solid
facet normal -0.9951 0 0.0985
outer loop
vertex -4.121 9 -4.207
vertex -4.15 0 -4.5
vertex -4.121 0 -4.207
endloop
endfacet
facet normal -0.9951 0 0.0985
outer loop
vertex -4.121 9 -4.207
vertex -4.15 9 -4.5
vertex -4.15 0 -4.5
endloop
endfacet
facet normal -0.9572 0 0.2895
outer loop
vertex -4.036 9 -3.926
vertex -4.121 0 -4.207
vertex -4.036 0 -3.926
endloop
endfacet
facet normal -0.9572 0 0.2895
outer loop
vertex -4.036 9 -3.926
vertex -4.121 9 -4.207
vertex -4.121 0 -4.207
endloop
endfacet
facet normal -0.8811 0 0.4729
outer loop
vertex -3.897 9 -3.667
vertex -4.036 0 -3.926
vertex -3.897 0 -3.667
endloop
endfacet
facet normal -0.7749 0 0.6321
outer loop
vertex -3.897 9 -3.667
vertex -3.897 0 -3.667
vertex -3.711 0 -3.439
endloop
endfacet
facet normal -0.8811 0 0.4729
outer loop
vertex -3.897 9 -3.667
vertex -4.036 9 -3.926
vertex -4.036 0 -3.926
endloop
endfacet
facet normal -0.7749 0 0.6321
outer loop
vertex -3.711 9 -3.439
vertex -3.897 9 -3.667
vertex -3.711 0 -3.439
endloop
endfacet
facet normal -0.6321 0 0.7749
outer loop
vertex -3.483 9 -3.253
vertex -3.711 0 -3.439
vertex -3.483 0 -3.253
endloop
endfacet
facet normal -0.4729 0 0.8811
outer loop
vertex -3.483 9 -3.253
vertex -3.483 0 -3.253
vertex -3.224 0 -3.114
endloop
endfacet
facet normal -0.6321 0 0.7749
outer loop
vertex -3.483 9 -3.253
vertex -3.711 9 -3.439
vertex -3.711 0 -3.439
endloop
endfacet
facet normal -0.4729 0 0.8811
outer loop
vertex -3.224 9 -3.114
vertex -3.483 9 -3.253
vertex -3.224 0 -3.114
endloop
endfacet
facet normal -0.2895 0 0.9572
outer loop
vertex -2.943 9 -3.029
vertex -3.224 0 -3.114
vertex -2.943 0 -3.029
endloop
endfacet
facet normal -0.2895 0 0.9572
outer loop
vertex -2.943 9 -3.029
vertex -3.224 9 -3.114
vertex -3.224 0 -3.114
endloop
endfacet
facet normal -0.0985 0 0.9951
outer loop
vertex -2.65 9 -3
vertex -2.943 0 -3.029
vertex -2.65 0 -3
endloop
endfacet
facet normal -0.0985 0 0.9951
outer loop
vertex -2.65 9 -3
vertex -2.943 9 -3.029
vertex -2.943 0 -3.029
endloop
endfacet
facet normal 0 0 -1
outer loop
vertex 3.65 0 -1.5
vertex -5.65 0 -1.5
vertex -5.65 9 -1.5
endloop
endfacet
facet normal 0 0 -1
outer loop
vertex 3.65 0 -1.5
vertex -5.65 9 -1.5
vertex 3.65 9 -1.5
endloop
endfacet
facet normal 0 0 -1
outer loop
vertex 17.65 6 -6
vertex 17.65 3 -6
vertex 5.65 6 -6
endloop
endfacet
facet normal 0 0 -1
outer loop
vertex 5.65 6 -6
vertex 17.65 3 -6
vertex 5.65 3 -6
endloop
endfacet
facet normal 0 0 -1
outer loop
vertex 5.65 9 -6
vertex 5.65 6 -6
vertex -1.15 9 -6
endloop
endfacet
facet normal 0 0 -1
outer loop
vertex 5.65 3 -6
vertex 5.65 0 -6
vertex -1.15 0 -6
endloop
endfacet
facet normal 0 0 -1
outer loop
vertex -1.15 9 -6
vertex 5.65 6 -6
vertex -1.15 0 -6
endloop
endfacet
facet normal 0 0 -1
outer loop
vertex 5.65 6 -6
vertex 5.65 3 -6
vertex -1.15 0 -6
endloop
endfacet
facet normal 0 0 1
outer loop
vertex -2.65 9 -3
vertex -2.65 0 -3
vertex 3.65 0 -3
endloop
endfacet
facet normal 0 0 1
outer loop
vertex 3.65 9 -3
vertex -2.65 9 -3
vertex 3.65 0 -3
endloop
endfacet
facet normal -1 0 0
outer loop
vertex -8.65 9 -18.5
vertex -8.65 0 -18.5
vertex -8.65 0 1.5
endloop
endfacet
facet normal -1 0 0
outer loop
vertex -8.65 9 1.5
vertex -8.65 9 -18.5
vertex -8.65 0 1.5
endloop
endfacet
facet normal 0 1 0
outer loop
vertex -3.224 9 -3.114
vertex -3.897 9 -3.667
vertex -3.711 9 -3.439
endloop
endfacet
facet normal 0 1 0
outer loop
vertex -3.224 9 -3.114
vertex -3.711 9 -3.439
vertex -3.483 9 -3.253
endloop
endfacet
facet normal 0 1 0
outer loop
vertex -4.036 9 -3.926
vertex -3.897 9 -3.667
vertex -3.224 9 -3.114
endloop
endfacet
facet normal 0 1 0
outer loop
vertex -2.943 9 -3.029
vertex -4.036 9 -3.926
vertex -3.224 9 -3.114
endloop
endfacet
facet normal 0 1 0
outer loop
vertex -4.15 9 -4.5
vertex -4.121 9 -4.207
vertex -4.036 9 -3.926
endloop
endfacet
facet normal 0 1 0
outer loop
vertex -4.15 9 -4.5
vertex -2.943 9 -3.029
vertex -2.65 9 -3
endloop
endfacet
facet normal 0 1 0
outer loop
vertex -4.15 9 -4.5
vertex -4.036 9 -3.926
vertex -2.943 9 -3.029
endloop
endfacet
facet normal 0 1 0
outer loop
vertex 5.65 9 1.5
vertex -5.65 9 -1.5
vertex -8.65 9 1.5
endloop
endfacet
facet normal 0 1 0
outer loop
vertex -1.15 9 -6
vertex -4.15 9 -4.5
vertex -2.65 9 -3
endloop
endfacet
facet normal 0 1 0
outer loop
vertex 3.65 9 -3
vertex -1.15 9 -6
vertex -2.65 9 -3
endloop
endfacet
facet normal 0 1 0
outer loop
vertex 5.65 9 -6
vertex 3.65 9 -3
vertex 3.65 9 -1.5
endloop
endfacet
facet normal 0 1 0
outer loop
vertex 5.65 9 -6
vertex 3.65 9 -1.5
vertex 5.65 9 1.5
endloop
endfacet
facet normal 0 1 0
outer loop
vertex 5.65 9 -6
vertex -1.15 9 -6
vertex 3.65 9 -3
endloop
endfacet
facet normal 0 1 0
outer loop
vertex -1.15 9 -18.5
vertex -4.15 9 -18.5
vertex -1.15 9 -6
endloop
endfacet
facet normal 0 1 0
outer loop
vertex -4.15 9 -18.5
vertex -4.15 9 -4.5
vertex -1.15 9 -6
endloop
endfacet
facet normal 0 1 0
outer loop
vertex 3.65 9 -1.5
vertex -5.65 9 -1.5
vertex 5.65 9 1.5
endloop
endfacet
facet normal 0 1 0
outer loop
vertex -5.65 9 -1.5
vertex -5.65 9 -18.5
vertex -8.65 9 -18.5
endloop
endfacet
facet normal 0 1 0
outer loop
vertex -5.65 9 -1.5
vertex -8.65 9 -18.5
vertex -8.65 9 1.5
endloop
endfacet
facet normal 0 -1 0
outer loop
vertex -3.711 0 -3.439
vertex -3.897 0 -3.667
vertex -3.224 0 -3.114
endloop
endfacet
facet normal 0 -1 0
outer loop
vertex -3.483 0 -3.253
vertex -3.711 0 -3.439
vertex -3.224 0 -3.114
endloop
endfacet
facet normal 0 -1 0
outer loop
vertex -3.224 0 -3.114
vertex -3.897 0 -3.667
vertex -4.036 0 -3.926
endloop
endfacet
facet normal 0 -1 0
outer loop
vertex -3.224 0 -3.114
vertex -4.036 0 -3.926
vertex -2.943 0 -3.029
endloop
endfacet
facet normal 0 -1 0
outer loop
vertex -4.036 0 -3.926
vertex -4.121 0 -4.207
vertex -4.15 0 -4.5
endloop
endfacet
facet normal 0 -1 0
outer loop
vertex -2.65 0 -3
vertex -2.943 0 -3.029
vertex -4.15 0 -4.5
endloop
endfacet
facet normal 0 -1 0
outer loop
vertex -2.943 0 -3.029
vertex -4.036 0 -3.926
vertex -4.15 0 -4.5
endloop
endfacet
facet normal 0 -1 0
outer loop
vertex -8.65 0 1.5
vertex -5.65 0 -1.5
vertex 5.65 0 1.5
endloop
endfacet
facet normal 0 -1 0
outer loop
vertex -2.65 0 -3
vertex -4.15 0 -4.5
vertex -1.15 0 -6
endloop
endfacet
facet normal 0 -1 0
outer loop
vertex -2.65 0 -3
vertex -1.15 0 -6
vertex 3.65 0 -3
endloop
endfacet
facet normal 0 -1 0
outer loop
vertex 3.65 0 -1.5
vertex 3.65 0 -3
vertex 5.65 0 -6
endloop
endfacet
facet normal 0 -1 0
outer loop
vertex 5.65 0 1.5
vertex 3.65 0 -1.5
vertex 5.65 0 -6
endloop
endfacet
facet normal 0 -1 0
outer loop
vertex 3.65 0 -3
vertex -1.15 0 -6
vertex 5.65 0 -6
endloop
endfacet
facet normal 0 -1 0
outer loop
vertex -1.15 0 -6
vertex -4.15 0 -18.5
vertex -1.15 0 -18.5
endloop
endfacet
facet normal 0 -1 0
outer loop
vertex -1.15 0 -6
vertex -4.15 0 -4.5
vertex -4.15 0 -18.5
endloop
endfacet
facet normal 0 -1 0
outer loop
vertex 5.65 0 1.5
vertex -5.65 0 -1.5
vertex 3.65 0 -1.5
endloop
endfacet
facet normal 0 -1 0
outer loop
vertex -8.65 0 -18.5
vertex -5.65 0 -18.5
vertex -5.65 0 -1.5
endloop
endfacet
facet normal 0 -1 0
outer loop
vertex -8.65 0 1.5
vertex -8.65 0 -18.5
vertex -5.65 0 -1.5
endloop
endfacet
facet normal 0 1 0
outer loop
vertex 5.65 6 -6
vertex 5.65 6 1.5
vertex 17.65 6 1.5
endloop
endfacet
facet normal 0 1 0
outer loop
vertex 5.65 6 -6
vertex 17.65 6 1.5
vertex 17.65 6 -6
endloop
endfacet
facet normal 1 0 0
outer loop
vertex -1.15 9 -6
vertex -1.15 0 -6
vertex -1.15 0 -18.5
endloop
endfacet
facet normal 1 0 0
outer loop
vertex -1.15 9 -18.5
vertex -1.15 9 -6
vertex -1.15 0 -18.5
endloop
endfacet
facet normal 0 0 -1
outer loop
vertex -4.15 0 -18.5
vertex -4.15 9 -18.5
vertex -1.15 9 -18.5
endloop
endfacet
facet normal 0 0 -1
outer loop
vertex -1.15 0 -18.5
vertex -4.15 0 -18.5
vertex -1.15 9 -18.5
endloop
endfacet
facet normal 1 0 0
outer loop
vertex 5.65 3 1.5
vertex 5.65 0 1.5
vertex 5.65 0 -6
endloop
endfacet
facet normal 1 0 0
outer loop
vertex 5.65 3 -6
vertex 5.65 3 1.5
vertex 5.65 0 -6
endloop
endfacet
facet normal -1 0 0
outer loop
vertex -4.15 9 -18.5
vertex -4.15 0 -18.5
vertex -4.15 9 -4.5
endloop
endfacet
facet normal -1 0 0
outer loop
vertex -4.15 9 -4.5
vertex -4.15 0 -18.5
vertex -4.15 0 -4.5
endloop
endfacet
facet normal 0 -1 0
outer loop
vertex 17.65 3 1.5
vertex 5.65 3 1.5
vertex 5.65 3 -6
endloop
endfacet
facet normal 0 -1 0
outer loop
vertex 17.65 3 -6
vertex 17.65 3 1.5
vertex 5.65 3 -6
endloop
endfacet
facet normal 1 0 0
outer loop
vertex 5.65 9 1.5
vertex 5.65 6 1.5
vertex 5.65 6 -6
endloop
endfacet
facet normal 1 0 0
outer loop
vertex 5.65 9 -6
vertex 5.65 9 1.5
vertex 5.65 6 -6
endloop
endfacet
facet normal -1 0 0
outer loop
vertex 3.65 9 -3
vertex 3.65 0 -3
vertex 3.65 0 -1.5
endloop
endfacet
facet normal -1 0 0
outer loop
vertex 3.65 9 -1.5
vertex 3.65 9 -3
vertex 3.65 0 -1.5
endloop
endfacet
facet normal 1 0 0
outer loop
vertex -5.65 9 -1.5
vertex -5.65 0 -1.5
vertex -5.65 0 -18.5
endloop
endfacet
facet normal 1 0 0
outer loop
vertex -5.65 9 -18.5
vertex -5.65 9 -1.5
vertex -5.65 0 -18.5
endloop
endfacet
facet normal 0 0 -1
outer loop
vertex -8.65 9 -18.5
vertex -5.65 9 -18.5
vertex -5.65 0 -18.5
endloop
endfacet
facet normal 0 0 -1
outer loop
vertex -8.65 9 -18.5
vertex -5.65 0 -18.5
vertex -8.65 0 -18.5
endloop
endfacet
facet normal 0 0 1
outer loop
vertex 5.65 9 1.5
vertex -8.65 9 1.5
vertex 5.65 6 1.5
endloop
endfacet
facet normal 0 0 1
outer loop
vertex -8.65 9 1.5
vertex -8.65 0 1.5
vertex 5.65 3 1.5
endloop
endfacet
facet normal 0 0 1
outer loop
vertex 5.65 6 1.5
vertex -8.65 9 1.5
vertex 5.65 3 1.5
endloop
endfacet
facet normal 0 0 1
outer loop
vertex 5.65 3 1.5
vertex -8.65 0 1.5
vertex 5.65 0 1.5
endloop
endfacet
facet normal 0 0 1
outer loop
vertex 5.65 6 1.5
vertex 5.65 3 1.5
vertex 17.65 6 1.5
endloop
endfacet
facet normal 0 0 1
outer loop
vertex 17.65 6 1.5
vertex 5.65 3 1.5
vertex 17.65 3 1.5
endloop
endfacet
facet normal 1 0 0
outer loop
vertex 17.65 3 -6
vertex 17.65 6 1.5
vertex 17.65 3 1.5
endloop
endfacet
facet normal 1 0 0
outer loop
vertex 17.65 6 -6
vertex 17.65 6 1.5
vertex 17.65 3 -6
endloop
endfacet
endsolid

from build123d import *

# Parameters (mm, degrees)
SKETCH1_W           = 11.3
SKETCH1_H           = 3
SKETCH1_W_2         = 3
SKETCH1_H_2         = 12.5
BOSS_EXTRUDE1_DEPTH = 9
FILLET1_R           = 1.5
SKETCH2_W           = 7.5
SKETCH2_H           = 3
BOSS_EXTRUDE2_DEPTH = 12


with BuildPart() as part:
    # Sketch1 → Boss-Extrude1 (new body)
    with BuildSketch(Plane(origin=(0, 0, 0), x_dir=(1, 0, 0), z_dir=(0, 1, 0))):
        Polygon((-8.65, -1.5), (-5.65, -1.5), (-5.65, 1.5), (-5.65, 18.5), (-8.65, 18.5), align=None)
        Rectangle(SKETCH1_W, SKETCH1_H)
        Polygon((3.65, 1.5), (5.65, 1.5), (5.65, 6), (3.65, 6), (3.65, 3), align=None)
        Polygon((-4.15, 3), (3.65, 3), (3.65, 6), (-1.15, 6), (-4.15, 6), align=None)
        with Locations((-2.65, 12.25)):
            Rectangle(SKETCH1_W_2, SKETCH1_H_2)
    extrude(amount=BOSS_EXTRUDE1_DEPTH)

    # Fillet1
    fillet1_edges = [part.edges().sort_by_distance(p)[0] for p in [
        (-4.15, 4.5, -3),
    ]]
    fillet(fillet1_edges, radius=FILLET1_R)

    # Sketch2 → Boss-Extrude2 (add)
    with BuildSketch(Plane(origin=(5.65, 0, 0), x_dir=(0, 0, -1), z_dir=(1, 0, 0))):
        with Locations((2.25, 4.5)):
            Rectangle(SKETCH2_W, SKETCH2_H)
    extrude(amount=BOSS_EXTRUDE2_DEPTH)


solid = part.part
